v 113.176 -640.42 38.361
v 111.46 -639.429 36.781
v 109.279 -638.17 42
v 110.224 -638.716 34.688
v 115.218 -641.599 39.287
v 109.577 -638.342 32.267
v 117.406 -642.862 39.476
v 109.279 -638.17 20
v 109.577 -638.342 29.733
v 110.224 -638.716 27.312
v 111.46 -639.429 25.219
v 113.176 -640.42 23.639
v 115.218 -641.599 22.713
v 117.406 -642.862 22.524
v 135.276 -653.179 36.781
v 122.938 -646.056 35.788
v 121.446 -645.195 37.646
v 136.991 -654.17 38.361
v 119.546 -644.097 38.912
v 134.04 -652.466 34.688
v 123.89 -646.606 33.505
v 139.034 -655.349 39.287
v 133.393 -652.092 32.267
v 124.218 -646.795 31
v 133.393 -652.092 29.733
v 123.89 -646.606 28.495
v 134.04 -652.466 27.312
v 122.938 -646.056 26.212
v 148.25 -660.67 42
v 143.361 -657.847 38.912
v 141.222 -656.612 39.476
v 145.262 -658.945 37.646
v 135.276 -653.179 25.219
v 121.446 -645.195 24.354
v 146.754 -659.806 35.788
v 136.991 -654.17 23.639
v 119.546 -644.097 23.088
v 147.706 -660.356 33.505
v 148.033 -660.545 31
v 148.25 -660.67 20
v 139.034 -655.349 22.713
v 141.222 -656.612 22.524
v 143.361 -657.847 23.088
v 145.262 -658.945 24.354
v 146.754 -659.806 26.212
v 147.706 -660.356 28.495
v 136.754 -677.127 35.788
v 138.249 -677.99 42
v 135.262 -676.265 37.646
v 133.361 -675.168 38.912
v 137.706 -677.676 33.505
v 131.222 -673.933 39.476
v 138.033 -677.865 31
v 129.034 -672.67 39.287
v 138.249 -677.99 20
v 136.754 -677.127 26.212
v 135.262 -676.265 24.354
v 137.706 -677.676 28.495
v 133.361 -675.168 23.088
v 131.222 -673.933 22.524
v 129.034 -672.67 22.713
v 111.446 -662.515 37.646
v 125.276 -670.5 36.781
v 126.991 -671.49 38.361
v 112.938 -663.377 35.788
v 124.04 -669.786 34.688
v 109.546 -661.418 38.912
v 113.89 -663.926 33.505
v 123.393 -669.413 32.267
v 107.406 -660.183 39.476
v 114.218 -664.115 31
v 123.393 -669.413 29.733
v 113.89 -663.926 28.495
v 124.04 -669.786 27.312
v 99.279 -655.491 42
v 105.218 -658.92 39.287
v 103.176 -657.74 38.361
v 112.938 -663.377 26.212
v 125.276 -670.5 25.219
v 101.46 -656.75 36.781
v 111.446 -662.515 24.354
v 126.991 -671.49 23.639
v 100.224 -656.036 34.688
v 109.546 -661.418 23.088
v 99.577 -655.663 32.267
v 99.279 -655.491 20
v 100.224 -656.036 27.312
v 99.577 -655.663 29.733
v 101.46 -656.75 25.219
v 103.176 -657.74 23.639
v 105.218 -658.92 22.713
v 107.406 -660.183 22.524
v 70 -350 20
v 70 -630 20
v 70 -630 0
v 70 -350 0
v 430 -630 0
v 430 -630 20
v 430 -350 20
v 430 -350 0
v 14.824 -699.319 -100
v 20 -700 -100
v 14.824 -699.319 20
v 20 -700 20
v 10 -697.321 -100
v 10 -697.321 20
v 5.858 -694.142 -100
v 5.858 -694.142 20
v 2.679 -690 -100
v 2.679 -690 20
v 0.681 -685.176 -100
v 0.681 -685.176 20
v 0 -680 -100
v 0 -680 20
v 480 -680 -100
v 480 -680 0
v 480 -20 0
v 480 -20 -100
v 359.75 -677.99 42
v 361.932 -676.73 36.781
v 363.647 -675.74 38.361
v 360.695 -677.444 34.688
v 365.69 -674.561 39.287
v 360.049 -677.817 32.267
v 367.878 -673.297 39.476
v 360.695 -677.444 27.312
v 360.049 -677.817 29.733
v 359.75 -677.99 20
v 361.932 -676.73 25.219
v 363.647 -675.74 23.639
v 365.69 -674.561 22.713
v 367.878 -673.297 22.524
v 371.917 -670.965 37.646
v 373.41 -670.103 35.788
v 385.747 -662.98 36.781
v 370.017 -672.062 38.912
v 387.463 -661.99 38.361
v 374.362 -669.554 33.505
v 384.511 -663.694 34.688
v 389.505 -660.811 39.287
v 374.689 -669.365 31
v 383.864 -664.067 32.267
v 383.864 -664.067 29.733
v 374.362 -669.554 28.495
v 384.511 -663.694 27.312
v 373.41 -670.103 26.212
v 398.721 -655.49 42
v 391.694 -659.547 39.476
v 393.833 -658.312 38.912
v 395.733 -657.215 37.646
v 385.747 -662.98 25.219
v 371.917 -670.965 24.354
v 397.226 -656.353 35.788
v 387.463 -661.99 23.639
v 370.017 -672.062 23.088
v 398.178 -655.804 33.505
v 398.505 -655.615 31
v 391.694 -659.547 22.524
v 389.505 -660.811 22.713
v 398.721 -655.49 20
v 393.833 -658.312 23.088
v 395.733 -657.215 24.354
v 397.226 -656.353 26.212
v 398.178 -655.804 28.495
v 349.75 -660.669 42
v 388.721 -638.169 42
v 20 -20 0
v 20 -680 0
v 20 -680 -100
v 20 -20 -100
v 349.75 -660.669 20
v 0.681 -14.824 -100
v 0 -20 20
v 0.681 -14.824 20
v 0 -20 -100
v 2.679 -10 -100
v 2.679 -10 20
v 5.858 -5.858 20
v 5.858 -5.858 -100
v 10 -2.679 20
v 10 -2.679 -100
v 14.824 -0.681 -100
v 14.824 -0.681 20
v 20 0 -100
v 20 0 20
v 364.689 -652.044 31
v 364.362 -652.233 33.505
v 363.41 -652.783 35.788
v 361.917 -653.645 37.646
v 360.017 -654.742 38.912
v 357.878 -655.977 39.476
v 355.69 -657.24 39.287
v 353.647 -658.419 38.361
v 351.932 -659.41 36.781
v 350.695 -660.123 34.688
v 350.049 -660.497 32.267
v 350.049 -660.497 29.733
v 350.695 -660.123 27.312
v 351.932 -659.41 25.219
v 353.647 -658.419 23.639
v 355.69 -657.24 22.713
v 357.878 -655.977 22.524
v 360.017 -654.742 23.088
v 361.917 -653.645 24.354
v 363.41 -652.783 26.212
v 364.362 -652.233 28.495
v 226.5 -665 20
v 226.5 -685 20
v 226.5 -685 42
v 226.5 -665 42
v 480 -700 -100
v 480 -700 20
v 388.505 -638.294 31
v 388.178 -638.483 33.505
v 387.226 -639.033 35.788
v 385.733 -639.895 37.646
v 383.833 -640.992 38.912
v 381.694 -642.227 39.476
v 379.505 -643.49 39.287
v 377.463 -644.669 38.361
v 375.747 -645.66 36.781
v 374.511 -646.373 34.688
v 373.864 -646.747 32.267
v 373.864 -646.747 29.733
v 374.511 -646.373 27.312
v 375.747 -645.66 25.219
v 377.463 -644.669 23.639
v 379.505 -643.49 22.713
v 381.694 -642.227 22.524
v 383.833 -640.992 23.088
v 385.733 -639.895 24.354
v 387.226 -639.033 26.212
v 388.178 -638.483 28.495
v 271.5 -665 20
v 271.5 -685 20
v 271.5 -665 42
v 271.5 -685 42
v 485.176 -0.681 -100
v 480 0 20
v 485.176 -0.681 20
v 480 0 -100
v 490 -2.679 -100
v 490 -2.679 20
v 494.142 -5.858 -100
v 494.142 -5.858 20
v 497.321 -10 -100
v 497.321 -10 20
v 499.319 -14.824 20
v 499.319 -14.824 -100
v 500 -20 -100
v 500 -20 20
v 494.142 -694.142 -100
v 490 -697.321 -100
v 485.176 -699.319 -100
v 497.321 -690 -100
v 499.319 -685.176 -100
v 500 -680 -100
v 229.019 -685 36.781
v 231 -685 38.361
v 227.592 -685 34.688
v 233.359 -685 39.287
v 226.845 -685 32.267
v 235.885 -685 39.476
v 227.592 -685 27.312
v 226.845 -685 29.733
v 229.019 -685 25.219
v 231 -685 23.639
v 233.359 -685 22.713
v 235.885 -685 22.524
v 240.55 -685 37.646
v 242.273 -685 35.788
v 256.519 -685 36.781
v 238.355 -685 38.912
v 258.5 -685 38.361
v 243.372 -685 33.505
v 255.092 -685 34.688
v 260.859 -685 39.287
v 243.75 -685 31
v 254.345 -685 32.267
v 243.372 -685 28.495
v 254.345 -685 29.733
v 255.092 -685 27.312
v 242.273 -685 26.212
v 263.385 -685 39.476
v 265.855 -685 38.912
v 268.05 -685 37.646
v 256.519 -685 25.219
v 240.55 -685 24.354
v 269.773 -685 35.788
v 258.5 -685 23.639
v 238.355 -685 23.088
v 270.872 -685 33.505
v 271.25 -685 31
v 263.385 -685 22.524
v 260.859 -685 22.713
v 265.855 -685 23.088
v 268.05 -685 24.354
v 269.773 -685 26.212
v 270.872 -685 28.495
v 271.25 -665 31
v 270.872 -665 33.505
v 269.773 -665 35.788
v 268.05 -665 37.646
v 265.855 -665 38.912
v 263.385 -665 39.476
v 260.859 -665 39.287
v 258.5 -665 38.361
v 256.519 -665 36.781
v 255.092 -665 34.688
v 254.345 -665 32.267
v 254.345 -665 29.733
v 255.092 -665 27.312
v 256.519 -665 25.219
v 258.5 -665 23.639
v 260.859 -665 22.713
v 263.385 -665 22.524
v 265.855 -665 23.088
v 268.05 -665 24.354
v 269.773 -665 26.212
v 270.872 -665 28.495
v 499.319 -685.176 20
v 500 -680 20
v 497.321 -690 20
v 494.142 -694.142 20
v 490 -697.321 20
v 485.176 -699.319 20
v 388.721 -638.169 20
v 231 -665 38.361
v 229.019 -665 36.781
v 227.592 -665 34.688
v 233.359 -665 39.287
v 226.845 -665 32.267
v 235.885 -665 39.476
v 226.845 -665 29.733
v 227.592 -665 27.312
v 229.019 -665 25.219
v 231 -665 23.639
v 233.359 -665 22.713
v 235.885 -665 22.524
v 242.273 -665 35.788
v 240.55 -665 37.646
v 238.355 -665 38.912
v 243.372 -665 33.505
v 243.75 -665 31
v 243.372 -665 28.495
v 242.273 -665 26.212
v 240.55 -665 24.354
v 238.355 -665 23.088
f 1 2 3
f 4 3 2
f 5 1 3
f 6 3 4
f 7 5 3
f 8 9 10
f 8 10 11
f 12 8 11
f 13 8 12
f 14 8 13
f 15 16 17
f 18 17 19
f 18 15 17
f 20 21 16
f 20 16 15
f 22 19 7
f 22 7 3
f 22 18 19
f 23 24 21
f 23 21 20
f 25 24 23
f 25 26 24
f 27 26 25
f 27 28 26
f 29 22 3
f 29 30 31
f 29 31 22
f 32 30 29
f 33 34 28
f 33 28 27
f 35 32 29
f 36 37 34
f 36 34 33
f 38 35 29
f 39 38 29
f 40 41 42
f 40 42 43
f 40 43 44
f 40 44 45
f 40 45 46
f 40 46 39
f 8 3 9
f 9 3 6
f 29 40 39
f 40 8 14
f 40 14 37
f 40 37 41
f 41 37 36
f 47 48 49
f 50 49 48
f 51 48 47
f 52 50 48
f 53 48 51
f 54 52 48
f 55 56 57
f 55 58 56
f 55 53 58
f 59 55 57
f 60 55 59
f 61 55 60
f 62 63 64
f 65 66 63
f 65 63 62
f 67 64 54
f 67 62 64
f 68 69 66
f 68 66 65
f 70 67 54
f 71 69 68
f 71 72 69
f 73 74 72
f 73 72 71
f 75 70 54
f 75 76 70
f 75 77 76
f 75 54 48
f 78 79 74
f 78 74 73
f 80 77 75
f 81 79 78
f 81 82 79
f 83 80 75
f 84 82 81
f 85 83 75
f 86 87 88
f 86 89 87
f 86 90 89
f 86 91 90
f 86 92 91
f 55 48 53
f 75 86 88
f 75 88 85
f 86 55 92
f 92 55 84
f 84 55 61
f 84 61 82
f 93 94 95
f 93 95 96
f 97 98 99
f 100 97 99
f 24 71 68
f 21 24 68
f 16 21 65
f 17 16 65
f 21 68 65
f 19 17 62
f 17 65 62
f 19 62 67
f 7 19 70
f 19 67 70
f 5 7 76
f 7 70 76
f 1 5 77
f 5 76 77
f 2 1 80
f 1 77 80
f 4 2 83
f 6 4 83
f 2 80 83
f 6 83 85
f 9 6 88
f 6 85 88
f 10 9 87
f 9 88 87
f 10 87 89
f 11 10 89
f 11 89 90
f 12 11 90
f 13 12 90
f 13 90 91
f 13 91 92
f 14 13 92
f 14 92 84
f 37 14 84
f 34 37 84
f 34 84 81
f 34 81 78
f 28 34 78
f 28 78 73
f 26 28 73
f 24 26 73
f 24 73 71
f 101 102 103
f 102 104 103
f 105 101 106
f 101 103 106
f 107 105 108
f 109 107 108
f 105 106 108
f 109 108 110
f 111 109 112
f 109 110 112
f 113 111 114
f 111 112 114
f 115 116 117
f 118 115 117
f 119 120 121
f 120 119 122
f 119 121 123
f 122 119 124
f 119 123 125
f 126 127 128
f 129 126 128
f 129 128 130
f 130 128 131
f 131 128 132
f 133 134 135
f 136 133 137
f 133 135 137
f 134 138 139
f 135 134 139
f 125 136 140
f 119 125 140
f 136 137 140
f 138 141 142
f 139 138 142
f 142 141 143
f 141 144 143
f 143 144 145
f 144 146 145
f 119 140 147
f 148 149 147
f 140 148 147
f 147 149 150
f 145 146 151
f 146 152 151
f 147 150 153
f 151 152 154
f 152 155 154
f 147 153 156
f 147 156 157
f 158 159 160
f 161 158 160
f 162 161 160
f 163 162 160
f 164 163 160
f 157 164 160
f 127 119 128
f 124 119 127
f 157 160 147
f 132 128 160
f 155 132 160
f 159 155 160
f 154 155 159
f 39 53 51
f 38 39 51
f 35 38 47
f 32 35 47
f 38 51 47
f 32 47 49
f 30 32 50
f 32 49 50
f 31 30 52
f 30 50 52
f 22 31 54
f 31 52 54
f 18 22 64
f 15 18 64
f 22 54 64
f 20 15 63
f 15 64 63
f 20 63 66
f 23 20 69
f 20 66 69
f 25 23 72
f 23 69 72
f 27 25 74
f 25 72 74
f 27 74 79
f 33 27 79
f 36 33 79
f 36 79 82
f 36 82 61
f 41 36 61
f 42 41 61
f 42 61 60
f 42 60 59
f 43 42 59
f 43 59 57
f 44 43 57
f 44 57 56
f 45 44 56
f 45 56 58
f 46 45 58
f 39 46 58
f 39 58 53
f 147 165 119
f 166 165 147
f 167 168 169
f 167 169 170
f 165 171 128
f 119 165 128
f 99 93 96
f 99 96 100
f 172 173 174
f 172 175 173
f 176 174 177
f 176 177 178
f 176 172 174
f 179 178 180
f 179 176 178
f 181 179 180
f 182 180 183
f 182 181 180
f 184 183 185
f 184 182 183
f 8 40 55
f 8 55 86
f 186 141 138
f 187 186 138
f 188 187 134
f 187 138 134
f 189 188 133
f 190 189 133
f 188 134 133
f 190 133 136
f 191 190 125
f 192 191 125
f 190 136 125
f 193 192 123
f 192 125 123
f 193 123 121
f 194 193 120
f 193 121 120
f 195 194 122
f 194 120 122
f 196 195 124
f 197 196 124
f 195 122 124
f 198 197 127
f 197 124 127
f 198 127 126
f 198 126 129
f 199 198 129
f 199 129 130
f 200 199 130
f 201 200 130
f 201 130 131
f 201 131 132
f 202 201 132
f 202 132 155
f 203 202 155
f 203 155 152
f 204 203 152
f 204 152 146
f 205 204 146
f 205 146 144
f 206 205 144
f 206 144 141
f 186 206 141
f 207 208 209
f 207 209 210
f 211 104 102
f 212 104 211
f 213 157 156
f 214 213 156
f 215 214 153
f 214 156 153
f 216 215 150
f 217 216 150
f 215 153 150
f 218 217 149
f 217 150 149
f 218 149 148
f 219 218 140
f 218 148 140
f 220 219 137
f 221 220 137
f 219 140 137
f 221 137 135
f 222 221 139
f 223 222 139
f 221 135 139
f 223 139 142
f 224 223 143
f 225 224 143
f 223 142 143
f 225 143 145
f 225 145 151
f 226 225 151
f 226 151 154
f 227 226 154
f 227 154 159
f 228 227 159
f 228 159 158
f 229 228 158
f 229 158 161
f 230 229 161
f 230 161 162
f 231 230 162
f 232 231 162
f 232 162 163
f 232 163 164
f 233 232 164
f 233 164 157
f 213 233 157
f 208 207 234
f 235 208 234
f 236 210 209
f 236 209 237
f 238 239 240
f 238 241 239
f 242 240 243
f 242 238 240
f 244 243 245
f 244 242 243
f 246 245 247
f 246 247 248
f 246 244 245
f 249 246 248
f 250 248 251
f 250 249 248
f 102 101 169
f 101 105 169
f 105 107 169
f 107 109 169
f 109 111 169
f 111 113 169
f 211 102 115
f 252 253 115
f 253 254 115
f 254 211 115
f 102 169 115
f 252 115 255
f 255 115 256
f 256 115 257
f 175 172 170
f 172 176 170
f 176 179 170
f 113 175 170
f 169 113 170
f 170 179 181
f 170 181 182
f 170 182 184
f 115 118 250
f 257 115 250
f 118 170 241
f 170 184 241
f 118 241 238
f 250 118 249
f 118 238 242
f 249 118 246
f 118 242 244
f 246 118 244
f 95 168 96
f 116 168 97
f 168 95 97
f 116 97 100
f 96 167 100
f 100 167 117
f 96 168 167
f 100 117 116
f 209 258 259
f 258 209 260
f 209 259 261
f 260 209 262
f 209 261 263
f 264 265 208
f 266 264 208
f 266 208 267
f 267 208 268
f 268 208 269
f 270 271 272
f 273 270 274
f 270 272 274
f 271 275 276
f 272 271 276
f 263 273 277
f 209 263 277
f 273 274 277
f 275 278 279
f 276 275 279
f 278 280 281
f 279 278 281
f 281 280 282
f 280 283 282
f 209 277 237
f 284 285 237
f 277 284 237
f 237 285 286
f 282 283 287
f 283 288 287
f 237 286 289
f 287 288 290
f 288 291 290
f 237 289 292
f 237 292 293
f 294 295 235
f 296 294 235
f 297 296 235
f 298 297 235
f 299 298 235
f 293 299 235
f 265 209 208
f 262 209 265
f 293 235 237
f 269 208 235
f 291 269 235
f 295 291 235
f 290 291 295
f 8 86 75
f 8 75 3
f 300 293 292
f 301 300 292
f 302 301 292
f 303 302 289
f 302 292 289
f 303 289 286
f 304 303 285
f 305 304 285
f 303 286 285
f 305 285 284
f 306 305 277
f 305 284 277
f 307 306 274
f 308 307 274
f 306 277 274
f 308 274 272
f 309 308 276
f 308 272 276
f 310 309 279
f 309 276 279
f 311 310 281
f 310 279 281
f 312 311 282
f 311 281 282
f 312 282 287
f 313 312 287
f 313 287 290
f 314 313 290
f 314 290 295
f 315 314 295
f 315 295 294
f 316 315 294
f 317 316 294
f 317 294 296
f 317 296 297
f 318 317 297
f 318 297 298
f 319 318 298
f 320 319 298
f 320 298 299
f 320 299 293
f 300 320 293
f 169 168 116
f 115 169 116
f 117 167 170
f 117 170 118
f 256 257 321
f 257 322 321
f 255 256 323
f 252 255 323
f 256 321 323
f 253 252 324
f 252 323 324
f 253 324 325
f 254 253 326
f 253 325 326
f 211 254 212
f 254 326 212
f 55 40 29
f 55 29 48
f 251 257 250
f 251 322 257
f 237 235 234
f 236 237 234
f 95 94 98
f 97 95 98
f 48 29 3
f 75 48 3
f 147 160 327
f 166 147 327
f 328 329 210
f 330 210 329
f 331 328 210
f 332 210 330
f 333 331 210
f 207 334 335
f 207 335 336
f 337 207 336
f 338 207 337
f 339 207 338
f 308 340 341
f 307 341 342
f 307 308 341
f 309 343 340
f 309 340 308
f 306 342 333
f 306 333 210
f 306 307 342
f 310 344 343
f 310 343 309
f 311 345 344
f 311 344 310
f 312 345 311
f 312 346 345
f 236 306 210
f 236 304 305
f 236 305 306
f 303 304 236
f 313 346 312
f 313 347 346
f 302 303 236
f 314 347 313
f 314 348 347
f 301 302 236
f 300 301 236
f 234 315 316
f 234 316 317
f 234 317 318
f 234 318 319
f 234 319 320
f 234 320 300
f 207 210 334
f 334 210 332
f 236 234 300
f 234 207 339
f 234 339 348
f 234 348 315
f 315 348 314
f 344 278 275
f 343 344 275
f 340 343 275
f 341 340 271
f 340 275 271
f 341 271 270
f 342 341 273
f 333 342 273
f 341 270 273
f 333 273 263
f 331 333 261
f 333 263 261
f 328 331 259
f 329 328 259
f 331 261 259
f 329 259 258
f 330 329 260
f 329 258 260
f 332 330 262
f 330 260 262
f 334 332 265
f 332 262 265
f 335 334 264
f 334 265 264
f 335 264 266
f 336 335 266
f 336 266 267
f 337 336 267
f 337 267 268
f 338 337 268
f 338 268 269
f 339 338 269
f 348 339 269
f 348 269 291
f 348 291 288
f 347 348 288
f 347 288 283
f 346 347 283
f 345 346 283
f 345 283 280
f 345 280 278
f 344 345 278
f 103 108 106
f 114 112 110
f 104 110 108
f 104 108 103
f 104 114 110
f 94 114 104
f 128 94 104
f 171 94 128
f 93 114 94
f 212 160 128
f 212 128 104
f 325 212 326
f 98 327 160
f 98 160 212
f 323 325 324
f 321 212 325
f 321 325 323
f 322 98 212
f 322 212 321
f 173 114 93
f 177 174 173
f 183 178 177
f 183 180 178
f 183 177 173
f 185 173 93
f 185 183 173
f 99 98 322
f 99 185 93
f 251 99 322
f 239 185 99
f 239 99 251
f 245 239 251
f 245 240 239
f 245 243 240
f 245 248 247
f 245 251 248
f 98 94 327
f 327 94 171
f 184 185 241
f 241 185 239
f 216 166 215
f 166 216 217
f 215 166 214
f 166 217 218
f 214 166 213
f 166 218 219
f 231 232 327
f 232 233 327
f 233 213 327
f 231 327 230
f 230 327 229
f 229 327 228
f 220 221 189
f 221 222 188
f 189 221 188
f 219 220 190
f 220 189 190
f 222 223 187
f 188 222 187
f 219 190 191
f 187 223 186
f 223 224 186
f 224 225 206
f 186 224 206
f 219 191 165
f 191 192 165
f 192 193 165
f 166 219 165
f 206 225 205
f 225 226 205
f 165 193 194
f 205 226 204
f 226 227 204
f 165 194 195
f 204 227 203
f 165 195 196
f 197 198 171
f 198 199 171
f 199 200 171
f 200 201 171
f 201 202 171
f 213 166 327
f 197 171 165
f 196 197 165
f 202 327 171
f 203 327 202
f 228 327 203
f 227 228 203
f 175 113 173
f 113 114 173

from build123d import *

# Parameters (mm, degrees)
SCHIZZO1_W                     = 500
SCHIZZO1_H                     = 700
ESTRUSIONE_ESTRUSIONE4_DEPTH   = 20
SCHIZZO1_4_W                   = 500
SCHIZZO1_4_H                   = 700
SCHIZZO1_4_W_2                 = 460
SCHIZZO1_4_H_2                 = 660
ESTRUSIONE_ESTRUSIONE5_DEPTH   = 100
ESTRUSIONE_ESTRUSIONE6_START   = 20
ESTRUSIONE_ESTRUSIONE6_DEPTH   = 22
SCHIZZO2_W                     = 45
SCHIZZO2_H                     = 20
ESTRUSIONE_ESTRUSIONE6_2_DEPTH = 22
ESTRUSIONE_ESTRUSIONE7_START   = 20
ESTRUSIONE_ESTRUSIONE7_DEPTH   = 22
SCHIZZO6_R                     = 8.5
TAGLIO_ESTRUSIONE1_DEPTH       = 22
SCHIZZO7_R                     = 8.5
TAGLIO_ESTRUSIONE2_DEPTH       = 22
SCHIZZO8_R                     = 8.5
TAGLIO_ESTRUSIONE3_DEPTH       = 22
SCHIZZO10_W                    = 360
SCHIZZO10_H                    = 280
TAGLIO_ESTRUSIONE4_DEPTH       = 22
RACCORDO1_R                    = 20
RACCORDO2_R                    = 20
RACCORDO3_R                    = 20
RACCORDO4_R                    = 20


with BuildPart() as part:
    # Schizzo1 → Estrusione-Estrusione4 (new body)
    with BuildSketch(Plane.XY):
        with Locations((250, -350)):
            Rectangle(SCHIZZO1_W, SCHIZZO1_H)
    extrude(amount=ESTRUSIONE_ESTRUSIONE4_DEPTH)

    # Schizzo1<4> → Estrusione-Estrusione5 (add)
    with BuildSketch(Plane.XY):
        with Locations((250, -350)):
            Rectangle(SCHIZZO1_4_W, SCHIZZO1_4_H)
        with Locations((250, -350)):
            Rectangle(SCHIZZO1_4_W_2, SCHIZZO1_4_H_2, mode=Mode.SUBTRACT)
    extrude(amount=-ESTRUSIONE_ESTRUSIONE5_DEPTH)

    # Schizzo2<3> → Estrusione-Estrusione7 (add)
    with BuildSketch(Plane.XY.offset(ESTRUSIONE_ESTRUSIONE7_START)):
        Polygon((359.75, -677.989883085), (398.72114317, -655.489883085), (388.72114317, -638.169375009), (349.75, -660.669375009), align=None)
    extrude(amount=ESTRUSIONE_ESTRUSIONE7_DEPTH)

    # Schizzo8 → Taglio-Estrusione3 (cut)
    with BuildSketch(Plane(origin=(383.51573113, -664.26873182, 0), x_dir=(0.866025404, 0.5, 0), z_dir=(0.5, -0.866025404, 0))):
        with Locations((-18.692302531, 31)):
            Circle(SCHIZZO8_R)
        with Locations((8.807697469, 31)):
            Circle(SCHIZZO8_R)
    extrude(amount=-TAGLIO_ESTRUSIONE3_DEPTH, mode=Mode.SUBTRACT)

    # Schizzo10 → Taglio-Estrusione4 (cut)
    with BuildSketch(Plane.XY.offset(20)):
        with Locations((250, -490)):
            Rectangle(SCHIZZO10_W, SCHIZZO10_H)
    extrude(amount=-TAGLIO_ESTRUSIONE4_DEPTH, mode=Mode.SUBTRACT)

    # Raccordo1
    raccordo1_edges = [part.edges().sort_by_distance(p)[0] for p in [
        (0, 0, -40),
    ]]
    fillet(raccordo1_edges, radius=RACCORDO1_R)

    # Raccordo2
    raccordo2_edges = [part.edges().sort_by_distance(p)[0] for p in [
        (500, 0, -40),
    ]]
    fillet(raccordo2_edges, radius=RACCORDO2_R)

    # Raccordo3
    raccordo3_edges = [part.edges().sort_by_distance(p)[0] for p in [
        (500, -700, -40),
    ]]
    fillet(raccordo3_edges, radius=RACCORDO3_R)

    # Raccordo4
    raccordo4_edges = [part.edges().sort_by_distance(p)[0] for p in [
        (0, -700, -40),
    ]]
    fillet(raccordo4_edges, radius=RACCORDO4_R)


with BuildPart() as body_2:
    # Schizzo2 → Estrusione-Estrusione6 (new body)
    with BuildSketch(Plane.XY.offset(ESTRUSIONE_ESTRUSIONE6_START)):
        Polygon((148.250287501, -660.670038978), (138.249137563, -677.989883085), (99.279144353, -655.490547015), (109.279144331, -638.170038978), align=None)
    extrude(amount=ESTRUSIONE_ESTRUSIONE6_DEPTH)

    # Schizzo6 → Taglio-Estrusione1 (cut)
    with BuildSketch(Plane(origin=(-259.01594674, -448.628779724, 0), x_dir=(0.866025404, -0.5, 0), z_dir=(-0.5, -0.866025404, 0))):
        with Locations((422.472870653, 31)):
            Circle(SCHIZZO6_R)
        with Locations((449.972870653, 31)):
            Circle(SCHIZZO6_R)
    extrude(amount=-TAGLIO_ESTRUSIONE1_DEPTH, mode=Mode.SUBTRACT)


with BuildPart() as body_3:
    # Schizzo2 → Estrusione-Estrusione6 2 (new body)
    with BuildSketch(Plane.XY.offset(ESTRUSIONE_ESTRUSIONE6_START)):
        with Locations((249, -675)):
            Rectangle(SCHIZZO2_W, SCHIZZO2_H)
    extrude(amount=ESTRUSIONE_ESTRUSIONE6_2_DEPTH)

    # Schizzo7 → Taglio-Estrusione2 (cut)
    with BuildSketch(Plane.XZ.offset(685)):
        with Locations((235.25, 31)):
            Circle(SCHIZZO7_R)
        with Locations((262.75, 31)):
            Circle(SCHIZZO7_R)
    extrude(amount=-TAGLIO_ESTRUSIONE2_DEPTH, mode=Mode.SUBTRACT)


solid = Compound([part.part, body_2.part, body_3.part])
